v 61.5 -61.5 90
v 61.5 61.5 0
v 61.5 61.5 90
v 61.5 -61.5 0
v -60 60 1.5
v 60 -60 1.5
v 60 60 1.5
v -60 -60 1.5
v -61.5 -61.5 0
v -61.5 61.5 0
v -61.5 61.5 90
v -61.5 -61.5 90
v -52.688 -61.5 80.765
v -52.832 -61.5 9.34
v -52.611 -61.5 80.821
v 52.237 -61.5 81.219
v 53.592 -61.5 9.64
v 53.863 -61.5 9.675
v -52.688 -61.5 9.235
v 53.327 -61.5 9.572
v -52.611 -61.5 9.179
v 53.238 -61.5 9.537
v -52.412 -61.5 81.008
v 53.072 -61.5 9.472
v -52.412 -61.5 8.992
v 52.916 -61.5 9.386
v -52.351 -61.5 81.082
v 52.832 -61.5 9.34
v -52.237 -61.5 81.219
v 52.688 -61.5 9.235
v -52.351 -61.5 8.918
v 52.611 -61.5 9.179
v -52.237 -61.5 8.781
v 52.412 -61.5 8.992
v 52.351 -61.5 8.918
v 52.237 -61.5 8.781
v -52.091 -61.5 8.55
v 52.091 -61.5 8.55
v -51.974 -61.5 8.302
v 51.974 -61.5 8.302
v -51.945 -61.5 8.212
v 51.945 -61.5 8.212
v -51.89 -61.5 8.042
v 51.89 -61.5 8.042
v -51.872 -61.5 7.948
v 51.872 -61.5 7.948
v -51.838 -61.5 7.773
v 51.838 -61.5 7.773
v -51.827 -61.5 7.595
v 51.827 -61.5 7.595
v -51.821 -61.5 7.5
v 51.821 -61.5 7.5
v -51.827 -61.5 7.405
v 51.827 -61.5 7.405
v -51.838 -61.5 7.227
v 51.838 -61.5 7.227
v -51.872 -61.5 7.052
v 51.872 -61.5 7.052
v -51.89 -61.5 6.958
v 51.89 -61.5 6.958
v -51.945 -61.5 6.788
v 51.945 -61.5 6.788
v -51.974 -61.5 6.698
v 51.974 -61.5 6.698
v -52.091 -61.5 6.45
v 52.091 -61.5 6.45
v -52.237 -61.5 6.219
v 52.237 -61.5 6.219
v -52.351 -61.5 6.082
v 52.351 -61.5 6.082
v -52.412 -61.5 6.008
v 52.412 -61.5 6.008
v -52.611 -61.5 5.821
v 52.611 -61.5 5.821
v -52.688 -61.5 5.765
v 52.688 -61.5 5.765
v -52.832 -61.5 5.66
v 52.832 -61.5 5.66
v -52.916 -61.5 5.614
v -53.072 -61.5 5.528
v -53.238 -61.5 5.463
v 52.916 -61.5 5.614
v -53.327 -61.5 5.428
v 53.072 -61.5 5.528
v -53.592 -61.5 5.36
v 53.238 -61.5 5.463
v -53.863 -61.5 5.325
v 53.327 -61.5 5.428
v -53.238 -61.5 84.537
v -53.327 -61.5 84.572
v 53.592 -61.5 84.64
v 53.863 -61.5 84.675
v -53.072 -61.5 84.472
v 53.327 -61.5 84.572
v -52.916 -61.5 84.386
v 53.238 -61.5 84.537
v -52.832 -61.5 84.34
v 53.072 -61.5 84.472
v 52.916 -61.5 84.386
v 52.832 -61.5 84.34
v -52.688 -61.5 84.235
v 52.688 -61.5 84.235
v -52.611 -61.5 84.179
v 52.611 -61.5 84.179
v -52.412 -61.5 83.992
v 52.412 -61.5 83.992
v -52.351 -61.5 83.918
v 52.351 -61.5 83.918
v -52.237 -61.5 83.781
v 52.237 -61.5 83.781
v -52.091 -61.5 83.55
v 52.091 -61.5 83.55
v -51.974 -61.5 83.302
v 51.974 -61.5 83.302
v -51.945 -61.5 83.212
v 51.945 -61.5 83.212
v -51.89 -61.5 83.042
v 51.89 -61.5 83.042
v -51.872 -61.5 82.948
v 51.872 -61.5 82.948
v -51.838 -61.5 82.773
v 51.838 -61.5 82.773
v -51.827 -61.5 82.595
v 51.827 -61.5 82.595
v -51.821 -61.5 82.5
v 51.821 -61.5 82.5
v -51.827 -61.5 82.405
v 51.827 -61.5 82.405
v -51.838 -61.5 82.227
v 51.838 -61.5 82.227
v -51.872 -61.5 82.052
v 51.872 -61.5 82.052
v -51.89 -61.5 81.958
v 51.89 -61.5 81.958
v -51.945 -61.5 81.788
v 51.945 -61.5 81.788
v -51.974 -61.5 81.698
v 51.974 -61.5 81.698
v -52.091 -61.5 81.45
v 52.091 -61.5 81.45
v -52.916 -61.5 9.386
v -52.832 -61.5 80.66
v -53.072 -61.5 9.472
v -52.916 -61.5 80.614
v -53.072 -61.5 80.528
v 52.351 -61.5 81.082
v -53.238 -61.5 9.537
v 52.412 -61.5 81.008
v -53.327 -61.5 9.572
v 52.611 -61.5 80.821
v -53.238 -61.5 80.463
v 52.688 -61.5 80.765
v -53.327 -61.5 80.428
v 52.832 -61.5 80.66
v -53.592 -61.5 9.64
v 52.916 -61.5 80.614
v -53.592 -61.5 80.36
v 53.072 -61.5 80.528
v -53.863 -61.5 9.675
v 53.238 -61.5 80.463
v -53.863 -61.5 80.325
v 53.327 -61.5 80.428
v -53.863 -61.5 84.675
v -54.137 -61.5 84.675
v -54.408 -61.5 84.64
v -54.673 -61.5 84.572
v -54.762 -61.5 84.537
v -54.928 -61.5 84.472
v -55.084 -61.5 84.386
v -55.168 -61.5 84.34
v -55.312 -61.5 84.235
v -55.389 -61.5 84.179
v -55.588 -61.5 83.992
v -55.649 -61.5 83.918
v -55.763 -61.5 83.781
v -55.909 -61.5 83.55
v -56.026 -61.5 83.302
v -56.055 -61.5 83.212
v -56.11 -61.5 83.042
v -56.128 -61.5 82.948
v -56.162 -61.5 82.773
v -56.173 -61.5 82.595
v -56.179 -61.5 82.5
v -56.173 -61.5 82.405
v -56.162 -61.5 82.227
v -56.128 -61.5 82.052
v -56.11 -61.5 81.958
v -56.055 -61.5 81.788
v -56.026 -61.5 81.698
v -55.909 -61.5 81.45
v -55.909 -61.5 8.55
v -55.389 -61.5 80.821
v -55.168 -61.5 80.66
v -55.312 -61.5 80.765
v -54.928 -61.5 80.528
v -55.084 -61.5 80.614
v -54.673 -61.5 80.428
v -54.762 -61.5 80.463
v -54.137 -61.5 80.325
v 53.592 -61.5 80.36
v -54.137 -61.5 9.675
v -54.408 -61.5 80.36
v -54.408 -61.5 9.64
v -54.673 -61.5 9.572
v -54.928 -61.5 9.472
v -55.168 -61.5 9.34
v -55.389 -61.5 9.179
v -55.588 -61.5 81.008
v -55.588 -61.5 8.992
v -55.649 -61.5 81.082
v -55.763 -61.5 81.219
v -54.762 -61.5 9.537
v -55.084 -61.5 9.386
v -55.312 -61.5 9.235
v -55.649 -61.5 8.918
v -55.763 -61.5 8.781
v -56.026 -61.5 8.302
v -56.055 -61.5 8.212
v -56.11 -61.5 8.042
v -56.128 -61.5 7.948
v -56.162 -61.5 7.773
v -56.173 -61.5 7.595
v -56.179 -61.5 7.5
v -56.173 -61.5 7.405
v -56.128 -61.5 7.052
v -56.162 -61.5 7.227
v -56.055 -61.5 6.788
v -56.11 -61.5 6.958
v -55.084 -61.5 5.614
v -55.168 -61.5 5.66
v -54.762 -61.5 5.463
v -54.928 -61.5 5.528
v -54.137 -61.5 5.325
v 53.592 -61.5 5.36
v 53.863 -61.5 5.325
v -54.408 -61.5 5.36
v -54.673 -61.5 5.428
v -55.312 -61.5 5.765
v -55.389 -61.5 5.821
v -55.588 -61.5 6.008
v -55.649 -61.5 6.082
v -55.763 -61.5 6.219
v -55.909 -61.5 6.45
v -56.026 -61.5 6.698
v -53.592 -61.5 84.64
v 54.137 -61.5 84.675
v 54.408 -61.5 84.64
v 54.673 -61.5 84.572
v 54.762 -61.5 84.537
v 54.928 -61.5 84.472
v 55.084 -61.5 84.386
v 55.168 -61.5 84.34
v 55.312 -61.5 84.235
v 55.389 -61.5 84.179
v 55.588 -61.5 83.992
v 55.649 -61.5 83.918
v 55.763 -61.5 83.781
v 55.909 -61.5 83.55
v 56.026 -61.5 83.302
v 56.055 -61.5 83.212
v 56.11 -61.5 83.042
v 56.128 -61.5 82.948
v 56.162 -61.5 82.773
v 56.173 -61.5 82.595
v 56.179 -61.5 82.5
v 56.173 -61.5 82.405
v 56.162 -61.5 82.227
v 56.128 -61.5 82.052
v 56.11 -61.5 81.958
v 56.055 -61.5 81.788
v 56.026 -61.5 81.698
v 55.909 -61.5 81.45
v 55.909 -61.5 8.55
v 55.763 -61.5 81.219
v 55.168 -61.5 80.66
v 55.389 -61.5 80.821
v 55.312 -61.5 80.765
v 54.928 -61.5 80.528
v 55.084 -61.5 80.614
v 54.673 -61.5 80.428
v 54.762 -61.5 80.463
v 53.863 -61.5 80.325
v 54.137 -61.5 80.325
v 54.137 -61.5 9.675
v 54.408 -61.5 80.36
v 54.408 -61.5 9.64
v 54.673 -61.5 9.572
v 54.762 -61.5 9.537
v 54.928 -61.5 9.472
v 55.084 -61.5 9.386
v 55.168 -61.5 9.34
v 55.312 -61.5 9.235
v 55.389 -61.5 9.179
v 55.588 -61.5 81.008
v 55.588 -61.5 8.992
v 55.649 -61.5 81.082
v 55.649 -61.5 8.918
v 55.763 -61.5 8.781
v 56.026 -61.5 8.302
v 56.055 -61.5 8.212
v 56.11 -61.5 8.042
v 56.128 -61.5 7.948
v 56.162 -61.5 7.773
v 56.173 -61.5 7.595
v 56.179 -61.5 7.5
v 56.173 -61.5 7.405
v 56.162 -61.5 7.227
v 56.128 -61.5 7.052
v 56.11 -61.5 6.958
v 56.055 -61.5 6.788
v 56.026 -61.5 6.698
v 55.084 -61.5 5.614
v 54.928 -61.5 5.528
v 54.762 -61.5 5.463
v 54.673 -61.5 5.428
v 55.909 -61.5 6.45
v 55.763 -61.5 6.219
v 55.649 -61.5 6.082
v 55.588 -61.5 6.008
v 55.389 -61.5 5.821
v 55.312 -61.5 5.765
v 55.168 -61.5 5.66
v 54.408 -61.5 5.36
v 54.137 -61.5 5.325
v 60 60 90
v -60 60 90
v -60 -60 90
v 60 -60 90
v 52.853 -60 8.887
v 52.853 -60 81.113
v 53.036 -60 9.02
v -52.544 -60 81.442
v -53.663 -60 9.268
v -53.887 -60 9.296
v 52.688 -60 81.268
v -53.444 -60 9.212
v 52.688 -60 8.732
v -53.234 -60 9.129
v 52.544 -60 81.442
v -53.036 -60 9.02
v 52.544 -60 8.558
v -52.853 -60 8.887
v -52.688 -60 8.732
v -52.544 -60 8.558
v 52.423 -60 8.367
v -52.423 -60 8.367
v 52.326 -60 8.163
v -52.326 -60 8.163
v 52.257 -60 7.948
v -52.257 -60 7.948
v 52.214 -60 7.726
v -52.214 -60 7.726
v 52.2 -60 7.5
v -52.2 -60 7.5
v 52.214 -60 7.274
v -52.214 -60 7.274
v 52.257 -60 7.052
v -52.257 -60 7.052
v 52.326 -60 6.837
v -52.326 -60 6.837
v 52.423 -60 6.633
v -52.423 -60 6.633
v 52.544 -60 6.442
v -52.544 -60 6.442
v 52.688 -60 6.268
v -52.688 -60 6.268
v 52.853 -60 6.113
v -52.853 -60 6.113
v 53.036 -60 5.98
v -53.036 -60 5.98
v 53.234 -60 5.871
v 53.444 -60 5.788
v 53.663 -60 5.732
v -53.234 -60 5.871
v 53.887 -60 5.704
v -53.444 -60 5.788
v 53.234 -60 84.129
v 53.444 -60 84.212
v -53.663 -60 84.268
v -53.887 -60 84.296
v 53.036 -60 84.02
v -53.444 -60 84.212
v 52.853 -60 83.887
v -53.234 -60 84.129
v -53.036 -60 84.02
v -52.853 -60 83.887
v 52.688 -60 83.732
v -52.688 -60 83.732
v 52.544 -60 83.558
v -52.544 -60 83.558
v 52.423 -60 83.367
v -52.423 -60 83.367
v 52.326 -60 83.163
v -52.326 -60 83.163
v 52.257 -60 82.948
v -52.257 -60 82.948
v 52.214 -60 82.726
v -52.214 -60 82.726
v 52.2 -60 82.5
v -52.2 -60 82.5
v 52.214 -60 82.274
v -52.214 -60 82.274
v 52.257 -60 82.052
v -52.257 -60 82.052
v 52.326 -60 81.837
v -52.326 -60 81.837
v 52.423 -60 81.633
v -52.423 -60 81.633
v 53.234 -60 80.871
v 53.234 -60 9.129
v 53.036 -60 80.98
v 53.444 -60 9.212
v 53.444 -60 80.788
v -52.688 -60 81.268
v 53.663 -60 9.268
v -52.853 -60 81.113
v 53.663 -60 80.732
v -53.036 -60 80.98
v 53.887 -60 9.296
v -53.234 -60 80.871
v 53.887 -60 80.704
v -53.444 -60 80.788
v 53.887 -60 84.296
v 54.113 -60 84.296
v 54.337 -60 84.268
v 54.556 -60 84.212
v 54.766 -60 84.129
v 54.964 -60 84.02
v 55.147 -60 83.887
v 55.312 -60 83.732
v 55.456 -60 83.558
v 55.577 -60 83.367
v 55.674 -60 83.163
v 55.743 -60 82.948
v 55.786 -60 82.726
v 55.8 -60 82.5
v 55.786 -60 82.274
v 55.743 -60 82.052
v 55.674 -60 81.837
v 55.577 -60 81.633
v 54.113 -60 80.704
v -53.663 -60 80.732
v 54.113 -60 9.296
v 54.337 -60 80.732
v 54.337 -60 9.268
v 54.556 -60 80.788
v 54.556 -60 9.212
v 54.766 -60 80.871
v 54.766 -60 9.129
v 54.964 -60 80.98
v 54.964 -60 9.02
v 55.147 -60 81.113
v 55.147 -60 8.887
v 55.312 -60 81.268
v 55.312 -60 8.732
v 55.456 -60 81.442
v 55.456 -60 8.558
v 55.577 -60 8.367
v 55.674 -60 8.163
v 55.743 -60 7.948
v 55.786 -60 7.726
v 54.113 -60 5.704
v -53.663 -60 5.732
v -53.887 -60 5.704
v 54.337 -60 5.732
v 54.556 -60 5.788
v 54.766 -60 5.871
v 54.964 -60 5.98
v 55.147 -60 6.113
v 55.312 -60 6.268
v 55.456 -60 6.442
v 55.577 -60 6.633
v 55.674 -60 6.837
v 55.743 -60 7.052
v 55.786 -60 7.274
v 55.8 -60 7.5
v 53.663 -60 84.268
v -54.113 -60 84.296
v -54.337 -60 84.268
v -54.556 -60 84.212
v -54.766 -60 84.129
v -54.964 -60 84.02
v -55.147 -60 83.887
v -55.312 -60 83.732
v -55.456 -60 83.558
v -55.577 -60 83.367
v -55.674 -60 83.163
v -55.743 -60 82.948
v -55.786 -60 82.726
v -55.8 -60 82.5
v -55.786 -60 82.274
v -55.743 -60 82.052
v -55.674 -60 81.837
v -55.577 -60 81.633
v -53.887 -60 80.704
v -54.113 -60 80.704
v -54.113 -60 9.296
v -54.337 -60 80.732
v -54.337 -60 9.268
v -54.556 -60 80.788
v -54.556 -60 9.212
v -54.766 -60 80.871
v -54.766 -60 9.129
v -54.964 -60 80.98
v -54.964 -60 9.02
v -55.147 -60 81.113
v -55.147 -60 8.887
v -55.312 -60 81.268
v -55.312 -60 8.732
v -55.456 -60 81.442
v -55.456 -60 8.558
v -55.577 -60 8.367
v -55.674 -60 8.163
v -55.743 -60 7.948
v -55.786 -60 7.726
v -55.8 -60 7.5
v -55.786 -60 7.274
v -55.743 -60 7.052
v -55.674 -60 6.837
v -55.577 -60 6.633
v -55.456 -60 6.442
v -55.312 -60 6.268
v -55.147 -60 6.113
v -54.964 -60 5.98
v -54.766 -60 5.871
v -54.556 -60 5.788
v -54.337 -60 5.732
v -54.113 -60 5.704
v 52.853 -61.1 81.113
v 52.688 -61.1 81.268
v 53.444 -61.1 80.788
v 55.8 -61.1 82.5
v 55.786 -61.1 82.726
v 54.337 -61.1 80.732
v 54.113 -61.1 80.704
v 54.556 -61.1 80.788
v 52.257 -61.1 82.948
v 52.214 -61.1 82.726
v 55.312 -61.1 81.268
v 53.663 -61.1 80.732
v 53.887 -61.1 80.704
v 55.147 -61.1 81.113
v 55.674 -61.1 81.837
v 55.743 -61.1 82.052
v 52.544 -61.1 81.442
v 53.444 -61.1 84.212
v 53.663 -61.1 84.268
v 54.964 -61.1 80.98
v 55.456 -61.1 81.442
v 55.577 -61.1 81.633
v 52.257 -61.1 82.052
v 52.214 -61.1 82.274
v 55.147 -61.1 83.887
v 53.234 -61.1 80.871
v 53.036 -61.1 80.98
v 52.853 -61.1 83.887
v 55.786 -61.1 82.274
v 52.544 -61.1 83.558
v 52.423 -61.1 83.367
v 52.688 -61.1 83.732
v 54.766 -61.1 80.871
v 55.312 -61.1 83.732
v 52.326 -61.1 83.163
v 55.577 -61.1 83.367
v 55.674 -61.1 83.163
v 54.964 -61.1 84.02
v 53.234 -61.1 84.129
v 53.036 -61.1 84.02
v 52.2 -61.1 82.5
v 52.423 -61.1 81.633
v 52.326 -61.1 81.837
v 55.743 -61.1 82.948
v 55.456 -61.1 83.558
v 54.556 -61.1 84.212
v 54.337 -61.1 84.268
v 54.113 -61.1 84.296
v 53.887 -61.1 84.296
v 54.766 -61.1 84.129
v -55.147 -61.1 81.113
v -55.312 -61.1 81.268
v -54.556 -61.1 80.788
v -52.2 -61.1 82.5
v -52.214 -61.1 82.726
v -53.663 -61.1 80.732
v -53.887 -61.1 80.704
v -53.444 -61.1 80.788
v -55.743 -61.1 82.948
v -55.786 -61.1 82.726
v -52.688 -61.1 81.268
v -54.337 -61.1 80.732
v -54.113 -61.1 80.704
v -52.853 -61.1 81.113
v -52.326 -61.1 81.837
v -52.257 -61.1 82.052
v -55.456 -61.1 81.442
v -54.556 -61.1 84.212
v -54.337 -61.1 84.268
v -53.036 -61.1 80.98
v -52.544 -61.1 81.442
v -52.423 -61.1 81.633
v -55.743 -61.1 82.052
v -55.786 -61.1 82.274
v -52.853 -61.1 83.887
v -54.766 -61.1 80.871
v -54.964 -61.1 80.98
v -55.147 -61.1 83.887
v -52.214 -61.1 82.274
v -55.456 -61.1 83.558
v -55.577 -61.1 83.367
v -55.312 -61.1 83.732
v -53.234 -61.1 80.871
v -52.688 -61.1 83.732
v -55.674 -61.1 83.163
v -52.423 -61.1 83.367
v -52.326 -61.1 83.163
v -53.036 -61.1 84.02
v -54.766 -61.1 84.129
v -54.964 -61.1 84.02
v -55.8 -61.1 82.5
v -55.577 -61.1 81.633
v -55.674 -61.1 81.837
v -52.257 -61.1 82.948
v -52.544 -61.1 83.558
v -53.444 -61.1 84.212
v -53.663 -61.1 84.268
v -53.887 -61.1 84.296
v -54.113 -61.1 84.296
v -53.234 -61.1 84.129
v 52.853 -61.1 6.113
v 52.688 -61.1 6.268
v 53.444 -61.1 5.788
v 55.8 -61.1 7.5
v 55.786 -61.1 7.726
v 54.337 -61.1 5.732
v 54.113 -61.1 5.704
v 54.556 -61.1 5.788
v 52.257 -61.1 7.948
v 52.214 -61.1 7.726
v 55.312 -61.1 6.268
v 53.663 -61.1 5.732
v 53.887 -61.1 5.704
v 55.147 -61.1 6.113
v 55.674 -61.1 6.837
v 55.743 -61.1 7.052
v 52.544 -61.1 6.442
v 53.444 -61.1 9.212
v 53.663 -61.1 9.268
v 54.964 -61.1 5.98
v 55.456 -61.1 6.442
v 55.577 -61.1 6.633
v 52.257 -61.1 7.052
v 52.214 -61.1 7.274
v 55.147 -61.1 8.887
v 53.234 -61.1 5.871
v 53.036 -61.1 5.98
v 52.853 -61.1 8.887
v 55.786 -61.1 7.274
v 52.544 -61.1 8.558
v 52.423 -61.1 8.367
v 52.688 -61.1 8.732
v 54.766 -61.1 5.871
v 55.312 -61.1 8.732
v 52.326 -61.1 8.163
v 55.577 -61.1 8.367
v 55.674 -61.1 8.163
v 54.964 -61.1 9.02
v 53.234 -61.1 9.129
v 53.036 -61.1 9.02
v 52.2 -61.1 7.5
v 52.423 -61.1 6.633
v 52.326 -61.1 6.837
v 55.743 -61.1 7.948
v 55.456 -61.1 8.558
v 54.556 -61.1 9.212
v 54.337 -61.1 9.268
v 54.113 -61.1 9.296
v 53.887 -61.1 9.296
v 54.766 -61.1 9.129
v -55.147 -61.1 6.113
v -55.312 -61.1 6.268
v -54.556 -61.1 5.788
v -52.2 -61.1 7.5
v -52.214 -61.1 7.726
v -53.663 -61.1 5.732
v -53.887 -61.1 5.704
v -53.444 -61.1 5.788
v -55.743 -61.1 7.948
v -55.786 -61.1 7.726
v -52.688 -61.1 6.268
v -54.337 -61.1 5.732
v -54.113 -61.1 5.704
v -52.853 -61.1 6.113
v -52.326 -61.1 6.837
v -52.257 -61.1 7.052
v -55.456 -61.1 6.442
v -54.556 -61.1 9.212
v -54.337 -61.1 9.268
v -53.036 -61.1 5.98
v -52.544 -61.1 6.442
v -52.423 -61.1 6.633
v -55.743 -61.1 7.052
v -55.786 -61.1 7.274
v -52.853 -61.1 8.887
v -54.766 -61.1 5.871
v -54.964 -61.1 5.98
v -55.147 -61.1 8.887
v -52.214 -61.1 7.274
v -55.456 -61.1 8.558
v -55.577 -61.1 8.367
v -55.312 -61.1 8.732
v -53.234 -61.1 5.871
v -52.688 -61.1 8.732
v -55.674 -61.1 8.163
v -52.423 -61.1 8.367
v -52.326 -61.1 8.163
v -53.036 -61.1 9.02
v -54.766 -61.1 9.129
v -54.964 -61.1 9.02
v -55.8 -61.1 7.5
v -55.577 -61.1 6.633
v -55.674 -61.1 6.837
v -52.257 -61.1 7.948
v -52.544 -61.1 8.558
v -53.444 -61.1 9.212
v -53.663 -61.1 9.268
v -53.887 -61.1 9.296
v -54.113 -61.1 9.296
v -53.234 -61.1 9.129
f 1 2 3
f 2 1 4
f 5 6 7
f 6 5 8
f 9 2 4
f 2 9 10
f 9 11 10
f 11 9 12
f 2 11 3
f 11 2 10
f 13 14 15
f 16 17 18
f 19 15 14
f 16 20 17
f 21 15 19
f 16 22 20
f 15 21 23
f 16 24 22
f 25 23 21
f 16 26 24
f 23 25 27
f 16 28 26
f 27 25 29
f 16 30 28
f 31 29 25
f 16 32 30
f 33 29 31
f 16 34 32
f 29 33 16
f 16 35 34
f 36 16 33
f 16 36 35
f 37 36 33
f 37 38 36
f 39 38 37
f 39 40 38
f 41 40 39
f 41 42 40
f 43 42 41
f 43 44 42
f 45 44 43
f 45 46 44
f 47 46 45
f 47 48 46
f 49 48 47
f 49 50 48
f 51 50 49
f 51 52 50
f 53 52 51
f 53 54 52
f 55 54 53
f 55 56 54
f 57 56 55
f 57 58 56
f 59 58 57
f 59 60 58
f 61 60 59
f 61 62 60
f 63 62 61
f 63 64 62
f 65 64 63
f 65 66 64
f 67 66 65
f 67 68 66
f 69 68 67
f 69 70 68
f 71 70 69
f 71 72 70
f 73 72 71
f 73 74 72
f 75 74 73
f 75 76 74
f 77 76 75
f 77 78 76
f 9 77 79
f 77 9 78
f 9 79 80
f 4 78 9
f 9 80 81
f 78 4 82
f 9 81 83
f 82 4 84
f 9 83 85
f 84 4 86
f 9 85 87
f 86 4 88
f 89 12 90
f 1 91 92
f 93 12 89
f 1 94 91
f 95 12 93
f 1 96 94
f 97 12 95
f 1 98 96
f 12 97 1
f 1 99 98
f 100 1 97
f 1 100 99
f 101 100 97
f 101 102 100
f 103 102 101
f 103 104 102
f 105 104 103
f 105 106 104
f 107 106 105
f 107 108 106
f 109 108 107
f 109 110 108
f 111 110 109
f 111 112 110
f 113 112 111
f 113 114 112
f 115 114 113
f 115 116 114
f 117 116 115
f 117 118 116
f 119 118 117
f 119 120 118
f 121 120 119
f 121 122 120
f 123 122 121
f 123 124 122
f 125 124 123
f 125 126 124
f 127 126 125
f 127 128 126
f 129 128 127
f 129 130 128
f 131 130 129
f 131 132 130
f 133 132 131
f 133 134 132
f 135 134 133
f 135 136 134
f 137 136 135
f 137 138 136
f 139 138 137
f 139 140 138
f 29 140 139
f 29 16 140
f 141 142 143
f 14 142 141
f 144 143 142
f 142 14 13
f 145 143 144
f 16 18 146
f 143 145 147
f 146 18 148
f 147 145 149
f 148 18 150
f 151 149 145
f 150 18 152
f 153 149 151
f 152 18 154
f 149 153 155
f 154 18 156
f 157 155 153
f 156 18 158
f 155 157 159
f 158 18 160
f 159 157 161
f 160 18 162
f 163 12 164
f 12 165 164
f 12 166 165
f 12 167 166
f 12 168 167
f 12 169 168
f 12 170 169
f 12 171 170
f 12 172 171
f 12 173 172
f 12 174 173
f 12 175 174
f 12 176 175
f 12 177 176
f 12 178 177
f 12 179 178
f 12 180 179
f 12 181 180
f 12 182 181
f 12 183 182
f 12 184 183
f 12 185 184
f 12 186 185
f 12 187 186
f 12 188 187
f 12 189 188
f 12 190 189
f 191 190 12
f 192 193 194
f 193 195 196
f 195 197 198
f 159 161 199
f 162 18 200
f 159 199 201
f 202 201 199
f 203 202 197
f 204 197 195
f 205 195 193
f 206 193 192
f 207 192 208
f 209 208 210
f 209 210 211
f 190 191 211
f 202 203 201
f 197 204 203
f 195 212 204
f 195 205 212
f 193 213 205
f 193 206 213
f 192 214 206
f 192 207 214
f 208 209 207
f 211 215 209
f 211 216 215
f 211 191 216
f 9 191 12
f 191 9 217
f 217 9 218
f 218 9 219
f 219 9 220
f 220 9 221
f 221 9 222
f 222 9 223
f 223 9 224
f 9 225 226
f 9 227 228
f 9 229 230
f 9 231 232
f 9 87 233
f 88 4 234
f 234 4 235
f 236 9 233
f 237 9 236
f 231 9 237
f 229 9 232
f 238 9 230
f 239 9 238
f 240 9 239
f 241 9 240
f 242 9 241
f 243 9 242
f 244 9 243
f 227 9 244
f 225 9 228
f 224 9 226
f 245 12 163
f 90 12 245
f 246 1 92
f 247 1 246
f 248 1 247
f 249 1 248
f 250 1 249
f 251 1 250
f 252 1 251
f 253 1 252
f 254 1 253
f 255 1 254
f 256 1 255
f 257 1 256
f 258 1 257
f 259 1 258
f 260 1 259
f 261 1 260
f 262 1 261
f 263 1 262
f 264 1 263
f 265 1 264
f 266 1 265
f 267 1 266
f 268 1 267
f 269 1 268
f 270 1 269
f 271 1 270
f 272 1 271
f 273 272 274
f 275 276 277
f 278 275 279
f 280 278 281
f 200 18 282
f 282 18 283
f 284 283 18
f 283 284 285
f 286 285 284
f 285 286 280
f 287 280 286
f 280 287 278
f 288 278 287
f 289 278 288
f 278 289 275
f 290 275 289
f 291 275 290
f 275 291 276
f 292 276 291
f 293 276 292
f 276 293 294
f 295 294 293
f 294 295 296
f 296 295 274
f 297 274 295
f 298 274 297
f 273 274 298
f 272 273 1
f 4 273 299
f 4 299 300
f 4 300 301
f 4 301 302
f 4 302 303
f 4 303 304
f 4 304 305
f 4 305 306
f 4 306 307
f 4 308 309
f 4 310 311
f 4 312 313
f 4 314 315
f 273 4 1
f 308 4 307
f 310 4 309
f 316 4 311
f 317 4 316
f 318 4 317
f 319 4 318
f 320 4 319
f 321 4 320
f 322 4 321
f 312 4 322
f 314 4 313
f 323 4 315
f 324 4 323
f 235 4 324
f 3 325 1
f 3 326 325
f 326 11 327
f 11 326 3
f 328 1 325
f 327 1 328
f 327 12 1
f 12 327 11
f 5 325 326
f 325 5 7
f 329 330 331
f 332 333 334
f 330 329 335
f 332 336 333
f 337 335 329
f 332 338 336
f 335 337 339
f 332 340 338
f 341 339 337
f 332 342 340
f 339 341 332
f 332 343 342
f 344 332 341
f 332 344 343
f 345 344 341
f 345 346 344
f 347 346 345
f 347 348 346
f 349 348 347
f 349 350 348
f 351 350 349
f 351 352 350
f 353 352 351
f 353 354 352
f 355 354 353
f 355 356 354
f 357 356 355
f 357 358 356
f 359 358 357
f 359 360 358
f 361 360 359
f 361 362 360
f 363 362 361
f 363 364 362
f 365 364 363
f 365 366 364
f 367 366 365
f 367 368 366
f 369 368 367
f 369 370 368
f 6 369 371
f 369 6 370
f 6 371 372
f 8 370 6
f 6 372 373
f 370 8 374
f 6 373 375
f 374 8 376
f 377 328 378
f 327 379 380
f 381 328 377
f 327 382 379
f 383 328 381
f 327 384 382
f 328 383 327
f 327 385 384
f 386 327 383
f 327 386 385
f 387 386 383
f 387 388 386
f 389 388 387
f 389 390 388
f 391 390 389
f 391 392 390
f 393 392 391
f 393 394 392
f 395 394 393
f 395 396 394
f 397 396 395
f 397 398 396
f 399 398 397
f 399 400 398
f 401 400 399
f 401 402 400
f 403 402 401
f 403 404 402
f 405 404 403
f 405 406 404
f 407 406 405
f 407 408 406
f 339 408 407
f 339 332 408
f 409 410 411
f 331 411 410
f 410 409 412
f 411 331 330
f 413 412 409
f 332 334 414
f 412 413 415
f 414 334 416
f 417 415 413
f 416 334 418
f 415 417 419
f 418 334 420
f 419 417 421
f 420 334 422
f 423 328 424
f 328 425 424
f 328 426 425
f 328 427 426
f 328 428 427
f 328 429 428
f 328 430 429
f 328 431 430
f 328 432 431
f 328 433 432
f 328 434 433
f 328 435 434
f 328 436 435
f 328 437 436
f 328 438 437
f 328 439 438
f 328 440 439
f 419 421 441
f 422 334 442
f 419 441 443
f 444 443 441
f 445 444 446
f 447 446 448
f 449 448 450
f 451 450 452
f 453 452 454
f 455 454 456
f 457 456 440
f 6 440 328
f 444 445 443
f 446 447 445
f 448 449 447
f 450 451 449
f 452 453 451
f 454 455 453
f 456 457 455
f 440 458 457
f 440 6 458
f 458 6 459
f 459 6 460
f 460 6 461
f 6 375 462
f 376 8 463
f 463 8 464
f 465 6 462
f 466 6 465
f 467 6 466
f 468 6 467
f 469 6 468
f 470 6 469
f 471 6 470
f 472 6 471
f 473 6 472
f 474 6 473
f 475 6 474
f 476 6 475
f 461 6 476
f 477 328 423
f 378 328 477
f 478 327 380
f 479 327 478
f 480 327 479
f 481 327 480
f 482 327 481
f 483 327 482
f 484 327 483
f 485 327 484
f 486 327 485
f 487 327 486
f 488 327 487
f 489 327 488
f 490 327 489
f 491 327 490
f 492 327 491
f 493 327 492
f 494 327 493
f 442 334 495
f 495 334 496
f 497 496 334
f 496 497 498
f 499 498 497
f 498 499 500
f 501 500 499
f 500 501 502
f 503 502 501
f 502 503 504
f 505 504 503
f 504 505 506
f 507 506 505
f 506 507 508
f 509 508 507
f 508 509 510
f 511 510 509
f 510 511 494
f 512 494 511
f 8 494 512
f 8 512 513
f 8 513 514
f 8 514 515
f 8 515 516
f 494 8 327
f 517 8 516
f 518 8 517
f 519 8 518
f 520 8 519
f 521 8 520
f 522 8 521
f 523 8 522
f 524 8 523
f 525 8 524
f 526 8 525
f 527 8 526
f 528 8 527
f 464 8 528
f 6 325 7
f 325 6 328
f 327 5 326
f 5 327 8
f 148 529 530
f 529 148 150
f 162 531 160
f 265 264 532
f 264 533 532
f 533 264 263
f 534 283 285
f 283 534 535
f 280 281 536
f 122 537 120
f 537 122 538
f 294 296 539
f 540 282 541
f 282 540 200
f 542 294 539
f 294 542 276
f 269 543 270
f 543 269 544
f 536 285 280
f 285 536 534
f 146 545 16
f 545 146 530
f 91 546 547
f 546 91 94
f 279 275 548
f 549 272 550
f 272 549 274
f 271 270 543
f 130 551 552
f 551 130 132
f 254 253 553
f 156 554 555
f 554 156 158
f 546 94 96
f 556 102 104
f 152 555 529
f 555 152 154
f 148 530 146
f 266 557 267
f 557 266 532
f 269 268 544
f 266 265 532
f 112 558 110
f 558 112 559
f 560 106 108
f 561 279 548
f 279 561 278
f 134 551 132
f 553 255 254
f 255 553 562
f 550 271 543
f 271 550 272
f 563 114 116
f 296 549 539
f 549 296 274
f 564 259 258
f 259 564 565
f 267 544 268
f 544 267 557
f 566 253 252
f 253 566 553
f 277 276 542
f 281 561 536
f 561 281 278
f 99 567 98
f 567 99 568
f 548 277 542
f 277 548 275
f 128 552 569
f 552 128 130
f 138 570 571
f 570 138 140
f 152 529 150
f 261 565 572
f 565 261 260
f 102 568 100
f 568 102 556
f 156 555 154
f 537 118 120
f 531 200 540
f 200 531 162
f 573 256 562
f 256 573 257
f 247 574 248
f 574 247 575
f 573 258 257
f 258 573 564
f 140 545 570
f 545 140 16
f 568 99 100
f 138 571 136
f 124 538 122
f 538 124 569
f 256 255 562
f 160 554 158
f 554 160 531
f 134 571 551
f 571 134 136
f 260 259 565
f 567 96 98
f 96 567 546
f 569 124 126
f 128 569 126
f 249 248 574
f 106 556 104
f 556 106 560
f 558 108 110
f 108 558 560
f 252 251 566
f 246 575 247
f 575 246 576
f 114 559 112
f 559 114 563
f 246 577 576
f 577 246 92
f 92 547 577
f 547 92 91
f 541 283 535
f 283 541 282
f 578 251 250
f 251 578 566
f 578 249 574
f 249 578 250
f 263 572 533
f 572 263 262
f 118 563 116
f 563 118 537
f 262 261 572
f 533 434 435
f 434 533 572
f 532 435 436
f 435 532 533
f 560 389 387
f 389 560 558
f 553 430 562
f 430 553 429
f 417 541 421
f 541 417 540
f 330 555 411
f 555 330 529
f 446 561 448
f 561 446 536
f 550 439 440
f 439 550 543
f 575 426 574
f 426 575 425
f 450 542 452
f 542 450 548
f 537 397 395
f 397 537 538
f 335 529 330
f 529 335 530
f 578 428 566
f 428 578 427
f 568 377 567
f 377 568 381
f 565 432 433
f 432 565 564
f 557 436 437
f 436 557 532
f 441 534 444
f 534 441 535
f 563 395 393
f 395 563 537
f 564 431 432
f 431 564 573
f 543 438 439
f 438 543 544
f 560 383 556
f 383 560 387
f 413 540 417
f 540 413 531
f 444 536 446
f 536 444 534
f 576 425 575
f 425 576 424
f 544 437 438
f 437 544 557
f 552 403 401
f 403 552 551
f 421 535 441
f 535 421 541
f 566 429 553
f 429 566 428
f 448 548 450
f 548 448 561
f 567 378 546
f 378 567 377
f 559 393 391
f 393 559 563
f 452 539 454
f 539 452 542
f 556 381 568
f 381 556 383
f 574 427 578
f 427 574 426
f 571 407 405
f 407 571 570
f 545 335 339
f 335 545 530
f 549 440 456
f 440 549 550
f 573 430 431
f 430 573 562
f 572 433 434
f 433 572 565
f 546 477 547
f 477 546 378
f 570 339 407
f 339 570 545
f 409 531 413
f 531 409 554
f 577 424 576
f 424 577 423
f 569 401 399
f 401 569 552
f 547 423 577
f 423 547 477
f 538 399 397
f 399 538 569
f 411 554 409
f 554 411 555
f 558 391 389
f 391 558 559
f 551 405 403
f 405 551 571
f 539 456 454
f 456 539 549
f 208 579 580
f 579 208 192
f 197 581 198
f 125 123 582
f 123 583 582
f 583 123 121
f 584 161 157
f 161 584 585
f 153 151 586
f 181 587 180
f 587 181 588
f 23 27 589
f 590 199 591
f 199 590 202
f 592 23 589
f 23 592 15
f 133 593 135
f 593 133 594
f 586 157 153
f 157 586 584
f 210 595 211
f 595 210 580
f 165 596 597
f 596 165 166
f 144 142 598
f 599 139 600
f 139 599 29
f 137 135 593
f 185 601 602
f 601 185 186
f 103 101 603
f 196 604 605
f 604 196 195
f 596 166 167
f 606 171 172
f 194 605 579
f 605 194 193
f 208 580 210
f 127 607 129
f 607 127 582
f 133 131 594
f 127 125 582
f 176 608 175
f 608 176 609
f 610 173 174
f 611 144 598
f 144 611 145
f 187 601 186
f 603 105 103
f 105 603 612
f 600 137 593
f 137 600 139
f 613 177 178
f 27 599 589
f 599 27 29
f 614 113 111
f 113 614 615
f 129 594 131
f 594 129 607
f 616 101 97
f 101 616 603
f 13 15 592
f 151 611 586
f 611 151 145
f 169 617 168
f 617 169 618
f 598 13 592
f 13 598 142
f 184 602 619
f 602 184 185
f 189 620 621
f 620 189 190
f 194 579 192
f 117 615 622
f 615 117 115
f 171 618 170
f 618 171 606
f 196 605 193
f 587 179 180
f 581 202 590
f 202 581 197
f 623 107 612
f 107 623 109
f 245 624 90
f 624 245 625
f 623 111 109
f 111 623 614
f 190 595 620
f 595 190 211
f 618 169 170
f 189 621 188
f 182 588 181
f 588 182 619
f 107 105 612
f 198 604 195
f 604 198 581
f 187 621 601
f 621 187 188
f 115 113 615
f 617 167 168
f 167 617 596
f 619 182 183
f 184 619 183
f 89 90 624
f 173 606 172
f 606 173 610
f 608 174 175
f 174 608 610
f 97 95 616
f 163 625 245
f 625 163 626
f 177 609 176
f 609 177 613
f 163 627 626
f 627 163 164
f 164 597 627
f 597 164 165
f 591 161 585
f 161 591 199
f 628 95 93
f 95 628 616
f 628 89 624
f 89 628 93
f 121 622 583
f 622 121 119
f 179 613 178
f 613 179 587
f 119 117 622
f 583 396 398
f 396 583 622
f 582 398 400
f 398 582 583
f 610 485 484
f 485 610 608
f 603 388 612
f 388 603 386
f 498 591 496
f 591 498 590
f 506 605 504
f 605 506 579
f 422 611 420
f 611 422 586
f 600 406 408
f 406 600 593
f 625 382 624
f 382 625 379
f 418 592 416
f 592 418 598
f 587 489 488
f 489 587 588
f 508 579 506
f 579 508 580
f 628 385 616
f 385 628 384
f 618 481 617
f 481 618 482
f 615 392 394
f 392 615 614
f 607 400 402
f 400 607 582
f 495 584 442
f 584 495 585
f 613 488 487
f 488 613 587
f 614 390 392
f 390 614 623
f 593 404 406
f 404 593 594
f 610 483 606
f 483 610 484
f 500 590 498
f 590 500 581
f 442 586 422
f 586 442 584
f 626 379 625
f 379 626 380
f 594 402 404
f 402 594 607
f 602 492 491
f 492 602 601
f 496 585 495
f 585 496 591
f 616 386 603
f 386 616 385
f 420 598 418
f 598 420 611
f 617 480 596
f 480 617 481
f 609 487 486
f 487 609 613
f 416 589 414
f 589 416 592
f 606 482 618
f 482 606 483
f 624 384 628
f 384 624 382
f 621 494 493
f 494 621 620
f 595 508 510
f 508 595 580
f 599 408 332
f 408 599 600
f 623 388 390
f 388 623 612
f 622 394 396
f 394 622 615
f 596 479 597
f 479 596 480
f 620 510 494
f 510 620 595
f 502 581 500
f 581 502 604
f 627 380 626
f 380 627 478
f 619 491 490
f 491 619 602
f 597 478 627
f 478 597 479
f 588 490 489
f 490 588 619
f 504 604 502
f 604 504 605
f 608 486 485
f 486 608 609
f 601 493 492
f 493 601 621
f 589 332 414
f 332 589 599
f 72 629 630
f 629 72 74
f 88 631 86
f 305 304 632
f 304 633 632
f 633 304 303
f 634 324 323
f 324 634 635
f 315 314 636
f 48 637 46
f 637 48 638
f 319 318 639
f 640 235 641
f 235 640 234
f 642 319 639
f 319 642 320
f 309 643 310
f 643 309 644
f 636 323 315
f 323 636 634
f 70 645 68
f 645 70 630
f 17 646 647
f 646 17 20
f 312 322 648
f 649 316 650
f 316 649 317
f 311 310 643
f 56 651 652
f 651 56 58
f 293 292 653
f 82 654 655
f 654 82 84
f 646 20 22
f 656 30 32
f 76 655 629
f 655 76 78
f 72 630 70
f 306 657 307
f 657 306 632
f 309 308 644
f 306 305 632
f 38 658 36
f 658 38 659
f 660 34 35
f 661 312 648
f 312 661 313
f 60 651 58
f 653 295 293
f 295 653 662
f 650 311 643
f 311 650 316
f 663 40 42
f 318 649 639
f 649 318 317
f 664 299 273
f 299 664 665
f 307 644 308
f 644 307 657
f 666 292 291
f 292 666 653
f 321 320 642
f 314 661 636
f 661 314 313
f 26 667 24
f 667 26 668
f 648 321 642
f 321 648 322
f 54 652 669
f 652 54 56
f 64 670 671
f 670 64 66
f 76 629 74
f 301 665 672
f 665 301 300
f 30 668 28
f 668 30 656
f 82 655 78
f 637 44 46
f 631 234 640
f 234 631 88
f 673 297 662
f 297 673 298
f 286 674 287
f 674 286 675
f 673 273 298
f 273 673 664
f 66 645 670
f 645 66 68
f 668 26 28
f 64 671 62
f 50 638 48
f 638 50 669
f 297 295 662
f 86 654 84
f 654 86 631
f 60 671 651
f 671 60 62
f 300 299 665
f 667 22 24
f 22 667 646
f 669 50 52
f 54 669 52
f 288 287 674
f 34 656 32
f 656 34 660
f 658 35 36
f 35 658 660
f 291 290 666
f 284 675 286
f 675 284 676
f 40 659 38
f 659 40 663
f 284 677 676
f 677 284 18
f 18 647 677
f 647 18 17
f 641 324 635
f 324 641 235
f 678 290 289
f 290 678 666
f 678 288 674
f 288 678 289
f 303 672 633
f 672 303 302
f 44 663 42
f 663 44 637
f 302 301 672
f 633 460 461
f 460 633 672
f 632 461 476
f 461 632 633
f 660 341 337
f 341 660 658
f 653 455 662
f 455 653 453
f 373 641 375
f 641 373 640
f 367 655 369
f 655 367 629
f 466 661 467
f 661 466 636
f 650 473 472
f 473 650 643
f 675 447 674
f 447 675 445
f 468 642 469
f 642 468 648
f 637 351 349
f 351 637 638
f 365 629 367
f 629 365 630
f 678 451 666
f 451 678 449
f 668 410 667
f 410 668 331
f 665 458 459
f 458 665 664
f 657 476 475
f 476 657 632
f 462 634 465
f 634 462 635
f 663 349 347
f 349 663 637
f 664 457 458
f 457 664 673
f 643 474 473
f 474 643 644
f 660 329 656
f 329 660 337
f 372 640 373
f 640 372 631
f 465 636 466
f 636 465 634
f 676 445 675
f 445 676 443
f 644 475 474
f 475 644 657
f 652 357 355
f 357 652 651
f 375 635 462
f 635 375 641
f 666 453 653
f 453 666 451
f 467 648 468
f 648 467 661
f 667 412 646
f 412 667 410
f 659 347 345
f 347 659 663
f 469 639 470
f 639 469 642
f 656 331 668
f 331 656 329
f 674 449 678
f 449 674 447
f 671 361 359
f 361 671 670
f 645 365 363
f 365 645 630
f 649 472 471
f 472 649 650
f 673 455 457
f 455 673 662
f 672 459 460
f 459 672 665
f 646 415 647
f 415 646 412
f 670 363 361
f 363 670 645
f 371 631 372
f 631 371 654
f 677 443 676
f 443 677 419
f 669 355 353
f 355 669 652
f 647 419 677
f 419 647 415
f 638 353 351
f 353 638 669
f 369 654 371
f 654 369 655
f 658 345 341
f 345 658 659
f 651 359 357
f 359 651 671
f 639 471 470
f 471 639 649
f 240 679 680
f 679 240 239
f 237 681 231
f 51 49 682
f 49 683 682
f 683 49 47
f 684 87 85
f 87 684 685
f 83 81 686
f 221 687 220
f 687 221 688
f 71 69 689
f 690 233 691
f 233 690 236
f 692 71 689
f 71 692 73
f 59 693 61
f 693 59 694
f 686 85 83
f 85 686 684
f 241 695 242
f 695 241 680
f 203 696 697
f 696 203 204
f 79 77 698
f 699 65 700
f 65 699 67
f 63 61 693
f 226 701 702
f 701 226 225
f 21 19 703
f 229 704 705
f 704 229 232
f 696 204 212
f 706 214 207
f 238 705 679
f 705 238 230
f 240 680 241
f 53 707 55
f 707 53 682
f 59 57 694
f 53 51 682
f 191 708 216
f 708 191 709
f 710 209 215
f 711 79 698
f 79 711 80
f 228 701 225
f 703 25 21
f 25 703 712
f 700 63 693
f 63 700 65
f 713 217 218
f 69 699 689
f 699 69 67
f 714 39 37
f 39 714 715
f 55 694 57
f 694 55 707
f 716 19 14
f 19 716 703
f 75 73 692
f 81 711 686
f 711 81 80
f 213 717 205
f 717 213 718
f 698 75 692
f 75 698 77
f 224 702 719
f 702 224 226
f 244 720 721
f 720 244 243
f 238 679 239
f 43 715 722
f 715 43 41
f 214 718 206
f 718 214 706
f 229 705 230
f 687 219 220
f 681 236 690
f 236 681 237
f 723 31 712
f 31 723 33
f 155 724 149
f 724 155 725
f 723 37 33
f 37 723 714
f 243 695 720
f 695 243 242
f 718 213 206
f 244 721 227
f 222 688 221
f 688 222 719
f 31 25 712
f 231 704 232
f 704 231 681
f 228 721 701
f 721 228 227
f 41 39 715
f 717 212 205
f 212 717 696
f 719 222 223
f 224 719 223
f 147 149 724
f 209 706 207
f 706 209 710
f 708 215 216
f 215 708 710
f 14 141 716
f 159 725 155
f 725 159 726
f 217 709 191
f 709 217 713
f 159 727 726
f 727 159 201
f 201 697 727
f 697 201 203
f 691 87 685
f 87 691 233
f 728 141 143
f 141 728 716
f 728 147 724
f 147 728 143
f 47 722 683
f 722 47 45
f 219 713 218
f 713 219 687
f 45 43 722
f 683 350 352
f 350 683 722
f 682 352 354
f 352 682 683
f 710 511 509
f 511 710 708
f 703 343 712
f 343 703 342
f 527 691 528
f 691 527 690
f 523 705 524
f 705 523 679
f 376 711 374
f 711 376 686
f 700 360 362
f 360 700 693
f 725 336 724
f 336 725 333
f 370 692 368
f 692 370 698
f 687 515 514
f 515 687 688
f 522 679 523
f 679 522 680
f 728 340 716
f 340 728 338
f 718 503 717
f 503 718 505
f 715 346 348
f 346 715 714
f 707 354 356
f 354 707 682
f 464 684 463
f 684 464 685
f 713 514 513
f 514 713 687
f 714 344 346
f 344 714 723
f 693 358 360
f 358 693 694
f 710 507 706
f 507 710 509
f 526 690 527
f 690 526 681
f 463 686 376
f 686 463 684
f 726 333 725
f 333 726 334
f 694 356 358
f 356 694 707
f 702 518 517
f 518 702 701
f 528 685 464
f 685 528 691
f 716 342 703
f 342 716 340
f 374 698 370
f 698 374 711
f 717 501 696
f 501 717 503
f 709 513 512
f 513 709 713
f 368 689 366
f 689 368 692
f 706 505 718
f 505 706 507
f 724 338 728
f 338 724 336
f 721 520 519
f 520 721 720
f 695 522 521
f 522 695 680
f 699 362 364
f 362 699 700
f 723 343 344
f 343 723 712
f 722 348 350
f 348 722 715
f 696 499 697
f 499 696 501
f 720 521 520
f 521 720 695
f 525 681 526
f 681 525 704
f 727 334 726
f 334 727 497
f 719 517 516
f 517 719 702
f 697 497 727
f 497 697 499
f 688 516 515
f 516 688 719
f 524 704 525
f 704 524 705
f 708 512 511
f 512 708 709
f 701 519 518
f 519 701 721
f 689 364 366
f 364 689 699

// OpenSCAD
$fn = 50;


difference() {
	union() {
		translate(v = [-61.5000000000, -61.5000000000, 0]) {
			cube(size = [123, 123, 1.5000000000]);
		}
		translate(v = [-61.5000000000, 60.0000000000, 0]) {
			cube(size = [123, 1.5000000000, 90]);
		}
		translate(v = [-61.5000000000, -61.5000000000, 0]) {
			cube(size = [123, 1.5000000000, 90]);
		}
		translate(v = [60.0000000000, -61.5000000000, 0]) {
			cube(size = [1.5000000000, 123, 90]);
		}
		translate(v = [-61.5000000000, -61.5000000000, 0]) {
			cube(size = [1.5000000000, 123, 90]);
		}
	}
	union() {
		translate(v = [54.0000000000, -63.0000000000, 82.5000000000]) {
			rotate(a = [90, 0, 0]) {
				difference() {
					union() {
						#translate(v = [0, 0, -15.0000000000]) {
							cylinder(h = 15, r = 1.5000000000);
						}
						#translate(v = [0, 0, -1.9000000000]) {
							cylinder(h = 1.9000000000, r1 = 1.8000000000, r2 = 3.6000000000);
						}
						#translate(v = [0, 0, -15.0000000000]) {
							cylinder(h = 15, r = 1.8000000000);
						}
						#translate(v = [0, 0, -15.0000000000]) {
							cylinder(h = 15, r = 1.5000000000);
						}
					}
					union();
				}
			}
		}
		translate(v = [-54.0000000000, -63.0000000000, 82.5000000000]) {
			rotate(a = [90, 0, 0]) {
				difference() {
					union() {
						#translate(v = [0, 0, -15.0000000000]) {
							cylinder(h = 15, r = 1.5000000000);
						}
						#translate(v = [0, 0, -1.9000000000]) {
							cylinder(h = 1.9000000000, r1 = 1.8000000000, r2 = 3.6000000000);
						}
						#translate(v = [0, 0, -15.0000000000]) {
							cylinder(h = 15, r = 1.8000000000);
						}
						#translate(v = [0, 0, -15.0000000000]) {
							cylinder(h = 15, r = 1.5000000000);
						}
					}
					union();
				}
			}
		}
		translate(v = [54.0000000000, -63.0000000000, 7.5000000000]) {
			rotate(a = [90, 0, 0]) {
				difference() {
					union() {
						#translate(v = [0, 0, -15.0000000000]) {
							cylinder(h = 15, r = 1.5000000000);
						}
						#translate(v = [0, 0, -1.9000000000]) {
							cylinder(h = 1.9000000000, r1 = 1.8000000000, r2 = 3.6000000000);
						}
						#translate(v = [0, 0, -15.0000000000]) {
							cylinder(h = 15, r = 1.8000000000);
						}
						#translate(v = [0, 0, -15.0000000000]) {
							cylinder(h = 15, r = 1.5000000000);
						}
					}
					union();
				}
			}
		}
		translate(v = [-54.0000000000, -63.0000000000, 7.5000000000]) {
			rotate(a = [90, 0, 0]) {
				difference() {
					union() {
						#translate(v = [0, 0, -15.0000000000]) {
							cylinder(h = 15, r = 1.5000000000);
						}
						#translate(v = [0, 0, -1.9000000000]) {
							cylinder(h = 1.9000000000, r1 = 1.8000000000, r2 = 3.6000000000);
						}
						#translate(v = [0, 0, -15.0000000000]) {
							cylinder(h = 15, r = 1.8000000000);
						}
						#translate(v = [0, 0, -15.0000000000]) {
							cylinder(h = 15, r = 1.5000000000);
						}
					}
					union();
				}
			}
		}
	}
}
